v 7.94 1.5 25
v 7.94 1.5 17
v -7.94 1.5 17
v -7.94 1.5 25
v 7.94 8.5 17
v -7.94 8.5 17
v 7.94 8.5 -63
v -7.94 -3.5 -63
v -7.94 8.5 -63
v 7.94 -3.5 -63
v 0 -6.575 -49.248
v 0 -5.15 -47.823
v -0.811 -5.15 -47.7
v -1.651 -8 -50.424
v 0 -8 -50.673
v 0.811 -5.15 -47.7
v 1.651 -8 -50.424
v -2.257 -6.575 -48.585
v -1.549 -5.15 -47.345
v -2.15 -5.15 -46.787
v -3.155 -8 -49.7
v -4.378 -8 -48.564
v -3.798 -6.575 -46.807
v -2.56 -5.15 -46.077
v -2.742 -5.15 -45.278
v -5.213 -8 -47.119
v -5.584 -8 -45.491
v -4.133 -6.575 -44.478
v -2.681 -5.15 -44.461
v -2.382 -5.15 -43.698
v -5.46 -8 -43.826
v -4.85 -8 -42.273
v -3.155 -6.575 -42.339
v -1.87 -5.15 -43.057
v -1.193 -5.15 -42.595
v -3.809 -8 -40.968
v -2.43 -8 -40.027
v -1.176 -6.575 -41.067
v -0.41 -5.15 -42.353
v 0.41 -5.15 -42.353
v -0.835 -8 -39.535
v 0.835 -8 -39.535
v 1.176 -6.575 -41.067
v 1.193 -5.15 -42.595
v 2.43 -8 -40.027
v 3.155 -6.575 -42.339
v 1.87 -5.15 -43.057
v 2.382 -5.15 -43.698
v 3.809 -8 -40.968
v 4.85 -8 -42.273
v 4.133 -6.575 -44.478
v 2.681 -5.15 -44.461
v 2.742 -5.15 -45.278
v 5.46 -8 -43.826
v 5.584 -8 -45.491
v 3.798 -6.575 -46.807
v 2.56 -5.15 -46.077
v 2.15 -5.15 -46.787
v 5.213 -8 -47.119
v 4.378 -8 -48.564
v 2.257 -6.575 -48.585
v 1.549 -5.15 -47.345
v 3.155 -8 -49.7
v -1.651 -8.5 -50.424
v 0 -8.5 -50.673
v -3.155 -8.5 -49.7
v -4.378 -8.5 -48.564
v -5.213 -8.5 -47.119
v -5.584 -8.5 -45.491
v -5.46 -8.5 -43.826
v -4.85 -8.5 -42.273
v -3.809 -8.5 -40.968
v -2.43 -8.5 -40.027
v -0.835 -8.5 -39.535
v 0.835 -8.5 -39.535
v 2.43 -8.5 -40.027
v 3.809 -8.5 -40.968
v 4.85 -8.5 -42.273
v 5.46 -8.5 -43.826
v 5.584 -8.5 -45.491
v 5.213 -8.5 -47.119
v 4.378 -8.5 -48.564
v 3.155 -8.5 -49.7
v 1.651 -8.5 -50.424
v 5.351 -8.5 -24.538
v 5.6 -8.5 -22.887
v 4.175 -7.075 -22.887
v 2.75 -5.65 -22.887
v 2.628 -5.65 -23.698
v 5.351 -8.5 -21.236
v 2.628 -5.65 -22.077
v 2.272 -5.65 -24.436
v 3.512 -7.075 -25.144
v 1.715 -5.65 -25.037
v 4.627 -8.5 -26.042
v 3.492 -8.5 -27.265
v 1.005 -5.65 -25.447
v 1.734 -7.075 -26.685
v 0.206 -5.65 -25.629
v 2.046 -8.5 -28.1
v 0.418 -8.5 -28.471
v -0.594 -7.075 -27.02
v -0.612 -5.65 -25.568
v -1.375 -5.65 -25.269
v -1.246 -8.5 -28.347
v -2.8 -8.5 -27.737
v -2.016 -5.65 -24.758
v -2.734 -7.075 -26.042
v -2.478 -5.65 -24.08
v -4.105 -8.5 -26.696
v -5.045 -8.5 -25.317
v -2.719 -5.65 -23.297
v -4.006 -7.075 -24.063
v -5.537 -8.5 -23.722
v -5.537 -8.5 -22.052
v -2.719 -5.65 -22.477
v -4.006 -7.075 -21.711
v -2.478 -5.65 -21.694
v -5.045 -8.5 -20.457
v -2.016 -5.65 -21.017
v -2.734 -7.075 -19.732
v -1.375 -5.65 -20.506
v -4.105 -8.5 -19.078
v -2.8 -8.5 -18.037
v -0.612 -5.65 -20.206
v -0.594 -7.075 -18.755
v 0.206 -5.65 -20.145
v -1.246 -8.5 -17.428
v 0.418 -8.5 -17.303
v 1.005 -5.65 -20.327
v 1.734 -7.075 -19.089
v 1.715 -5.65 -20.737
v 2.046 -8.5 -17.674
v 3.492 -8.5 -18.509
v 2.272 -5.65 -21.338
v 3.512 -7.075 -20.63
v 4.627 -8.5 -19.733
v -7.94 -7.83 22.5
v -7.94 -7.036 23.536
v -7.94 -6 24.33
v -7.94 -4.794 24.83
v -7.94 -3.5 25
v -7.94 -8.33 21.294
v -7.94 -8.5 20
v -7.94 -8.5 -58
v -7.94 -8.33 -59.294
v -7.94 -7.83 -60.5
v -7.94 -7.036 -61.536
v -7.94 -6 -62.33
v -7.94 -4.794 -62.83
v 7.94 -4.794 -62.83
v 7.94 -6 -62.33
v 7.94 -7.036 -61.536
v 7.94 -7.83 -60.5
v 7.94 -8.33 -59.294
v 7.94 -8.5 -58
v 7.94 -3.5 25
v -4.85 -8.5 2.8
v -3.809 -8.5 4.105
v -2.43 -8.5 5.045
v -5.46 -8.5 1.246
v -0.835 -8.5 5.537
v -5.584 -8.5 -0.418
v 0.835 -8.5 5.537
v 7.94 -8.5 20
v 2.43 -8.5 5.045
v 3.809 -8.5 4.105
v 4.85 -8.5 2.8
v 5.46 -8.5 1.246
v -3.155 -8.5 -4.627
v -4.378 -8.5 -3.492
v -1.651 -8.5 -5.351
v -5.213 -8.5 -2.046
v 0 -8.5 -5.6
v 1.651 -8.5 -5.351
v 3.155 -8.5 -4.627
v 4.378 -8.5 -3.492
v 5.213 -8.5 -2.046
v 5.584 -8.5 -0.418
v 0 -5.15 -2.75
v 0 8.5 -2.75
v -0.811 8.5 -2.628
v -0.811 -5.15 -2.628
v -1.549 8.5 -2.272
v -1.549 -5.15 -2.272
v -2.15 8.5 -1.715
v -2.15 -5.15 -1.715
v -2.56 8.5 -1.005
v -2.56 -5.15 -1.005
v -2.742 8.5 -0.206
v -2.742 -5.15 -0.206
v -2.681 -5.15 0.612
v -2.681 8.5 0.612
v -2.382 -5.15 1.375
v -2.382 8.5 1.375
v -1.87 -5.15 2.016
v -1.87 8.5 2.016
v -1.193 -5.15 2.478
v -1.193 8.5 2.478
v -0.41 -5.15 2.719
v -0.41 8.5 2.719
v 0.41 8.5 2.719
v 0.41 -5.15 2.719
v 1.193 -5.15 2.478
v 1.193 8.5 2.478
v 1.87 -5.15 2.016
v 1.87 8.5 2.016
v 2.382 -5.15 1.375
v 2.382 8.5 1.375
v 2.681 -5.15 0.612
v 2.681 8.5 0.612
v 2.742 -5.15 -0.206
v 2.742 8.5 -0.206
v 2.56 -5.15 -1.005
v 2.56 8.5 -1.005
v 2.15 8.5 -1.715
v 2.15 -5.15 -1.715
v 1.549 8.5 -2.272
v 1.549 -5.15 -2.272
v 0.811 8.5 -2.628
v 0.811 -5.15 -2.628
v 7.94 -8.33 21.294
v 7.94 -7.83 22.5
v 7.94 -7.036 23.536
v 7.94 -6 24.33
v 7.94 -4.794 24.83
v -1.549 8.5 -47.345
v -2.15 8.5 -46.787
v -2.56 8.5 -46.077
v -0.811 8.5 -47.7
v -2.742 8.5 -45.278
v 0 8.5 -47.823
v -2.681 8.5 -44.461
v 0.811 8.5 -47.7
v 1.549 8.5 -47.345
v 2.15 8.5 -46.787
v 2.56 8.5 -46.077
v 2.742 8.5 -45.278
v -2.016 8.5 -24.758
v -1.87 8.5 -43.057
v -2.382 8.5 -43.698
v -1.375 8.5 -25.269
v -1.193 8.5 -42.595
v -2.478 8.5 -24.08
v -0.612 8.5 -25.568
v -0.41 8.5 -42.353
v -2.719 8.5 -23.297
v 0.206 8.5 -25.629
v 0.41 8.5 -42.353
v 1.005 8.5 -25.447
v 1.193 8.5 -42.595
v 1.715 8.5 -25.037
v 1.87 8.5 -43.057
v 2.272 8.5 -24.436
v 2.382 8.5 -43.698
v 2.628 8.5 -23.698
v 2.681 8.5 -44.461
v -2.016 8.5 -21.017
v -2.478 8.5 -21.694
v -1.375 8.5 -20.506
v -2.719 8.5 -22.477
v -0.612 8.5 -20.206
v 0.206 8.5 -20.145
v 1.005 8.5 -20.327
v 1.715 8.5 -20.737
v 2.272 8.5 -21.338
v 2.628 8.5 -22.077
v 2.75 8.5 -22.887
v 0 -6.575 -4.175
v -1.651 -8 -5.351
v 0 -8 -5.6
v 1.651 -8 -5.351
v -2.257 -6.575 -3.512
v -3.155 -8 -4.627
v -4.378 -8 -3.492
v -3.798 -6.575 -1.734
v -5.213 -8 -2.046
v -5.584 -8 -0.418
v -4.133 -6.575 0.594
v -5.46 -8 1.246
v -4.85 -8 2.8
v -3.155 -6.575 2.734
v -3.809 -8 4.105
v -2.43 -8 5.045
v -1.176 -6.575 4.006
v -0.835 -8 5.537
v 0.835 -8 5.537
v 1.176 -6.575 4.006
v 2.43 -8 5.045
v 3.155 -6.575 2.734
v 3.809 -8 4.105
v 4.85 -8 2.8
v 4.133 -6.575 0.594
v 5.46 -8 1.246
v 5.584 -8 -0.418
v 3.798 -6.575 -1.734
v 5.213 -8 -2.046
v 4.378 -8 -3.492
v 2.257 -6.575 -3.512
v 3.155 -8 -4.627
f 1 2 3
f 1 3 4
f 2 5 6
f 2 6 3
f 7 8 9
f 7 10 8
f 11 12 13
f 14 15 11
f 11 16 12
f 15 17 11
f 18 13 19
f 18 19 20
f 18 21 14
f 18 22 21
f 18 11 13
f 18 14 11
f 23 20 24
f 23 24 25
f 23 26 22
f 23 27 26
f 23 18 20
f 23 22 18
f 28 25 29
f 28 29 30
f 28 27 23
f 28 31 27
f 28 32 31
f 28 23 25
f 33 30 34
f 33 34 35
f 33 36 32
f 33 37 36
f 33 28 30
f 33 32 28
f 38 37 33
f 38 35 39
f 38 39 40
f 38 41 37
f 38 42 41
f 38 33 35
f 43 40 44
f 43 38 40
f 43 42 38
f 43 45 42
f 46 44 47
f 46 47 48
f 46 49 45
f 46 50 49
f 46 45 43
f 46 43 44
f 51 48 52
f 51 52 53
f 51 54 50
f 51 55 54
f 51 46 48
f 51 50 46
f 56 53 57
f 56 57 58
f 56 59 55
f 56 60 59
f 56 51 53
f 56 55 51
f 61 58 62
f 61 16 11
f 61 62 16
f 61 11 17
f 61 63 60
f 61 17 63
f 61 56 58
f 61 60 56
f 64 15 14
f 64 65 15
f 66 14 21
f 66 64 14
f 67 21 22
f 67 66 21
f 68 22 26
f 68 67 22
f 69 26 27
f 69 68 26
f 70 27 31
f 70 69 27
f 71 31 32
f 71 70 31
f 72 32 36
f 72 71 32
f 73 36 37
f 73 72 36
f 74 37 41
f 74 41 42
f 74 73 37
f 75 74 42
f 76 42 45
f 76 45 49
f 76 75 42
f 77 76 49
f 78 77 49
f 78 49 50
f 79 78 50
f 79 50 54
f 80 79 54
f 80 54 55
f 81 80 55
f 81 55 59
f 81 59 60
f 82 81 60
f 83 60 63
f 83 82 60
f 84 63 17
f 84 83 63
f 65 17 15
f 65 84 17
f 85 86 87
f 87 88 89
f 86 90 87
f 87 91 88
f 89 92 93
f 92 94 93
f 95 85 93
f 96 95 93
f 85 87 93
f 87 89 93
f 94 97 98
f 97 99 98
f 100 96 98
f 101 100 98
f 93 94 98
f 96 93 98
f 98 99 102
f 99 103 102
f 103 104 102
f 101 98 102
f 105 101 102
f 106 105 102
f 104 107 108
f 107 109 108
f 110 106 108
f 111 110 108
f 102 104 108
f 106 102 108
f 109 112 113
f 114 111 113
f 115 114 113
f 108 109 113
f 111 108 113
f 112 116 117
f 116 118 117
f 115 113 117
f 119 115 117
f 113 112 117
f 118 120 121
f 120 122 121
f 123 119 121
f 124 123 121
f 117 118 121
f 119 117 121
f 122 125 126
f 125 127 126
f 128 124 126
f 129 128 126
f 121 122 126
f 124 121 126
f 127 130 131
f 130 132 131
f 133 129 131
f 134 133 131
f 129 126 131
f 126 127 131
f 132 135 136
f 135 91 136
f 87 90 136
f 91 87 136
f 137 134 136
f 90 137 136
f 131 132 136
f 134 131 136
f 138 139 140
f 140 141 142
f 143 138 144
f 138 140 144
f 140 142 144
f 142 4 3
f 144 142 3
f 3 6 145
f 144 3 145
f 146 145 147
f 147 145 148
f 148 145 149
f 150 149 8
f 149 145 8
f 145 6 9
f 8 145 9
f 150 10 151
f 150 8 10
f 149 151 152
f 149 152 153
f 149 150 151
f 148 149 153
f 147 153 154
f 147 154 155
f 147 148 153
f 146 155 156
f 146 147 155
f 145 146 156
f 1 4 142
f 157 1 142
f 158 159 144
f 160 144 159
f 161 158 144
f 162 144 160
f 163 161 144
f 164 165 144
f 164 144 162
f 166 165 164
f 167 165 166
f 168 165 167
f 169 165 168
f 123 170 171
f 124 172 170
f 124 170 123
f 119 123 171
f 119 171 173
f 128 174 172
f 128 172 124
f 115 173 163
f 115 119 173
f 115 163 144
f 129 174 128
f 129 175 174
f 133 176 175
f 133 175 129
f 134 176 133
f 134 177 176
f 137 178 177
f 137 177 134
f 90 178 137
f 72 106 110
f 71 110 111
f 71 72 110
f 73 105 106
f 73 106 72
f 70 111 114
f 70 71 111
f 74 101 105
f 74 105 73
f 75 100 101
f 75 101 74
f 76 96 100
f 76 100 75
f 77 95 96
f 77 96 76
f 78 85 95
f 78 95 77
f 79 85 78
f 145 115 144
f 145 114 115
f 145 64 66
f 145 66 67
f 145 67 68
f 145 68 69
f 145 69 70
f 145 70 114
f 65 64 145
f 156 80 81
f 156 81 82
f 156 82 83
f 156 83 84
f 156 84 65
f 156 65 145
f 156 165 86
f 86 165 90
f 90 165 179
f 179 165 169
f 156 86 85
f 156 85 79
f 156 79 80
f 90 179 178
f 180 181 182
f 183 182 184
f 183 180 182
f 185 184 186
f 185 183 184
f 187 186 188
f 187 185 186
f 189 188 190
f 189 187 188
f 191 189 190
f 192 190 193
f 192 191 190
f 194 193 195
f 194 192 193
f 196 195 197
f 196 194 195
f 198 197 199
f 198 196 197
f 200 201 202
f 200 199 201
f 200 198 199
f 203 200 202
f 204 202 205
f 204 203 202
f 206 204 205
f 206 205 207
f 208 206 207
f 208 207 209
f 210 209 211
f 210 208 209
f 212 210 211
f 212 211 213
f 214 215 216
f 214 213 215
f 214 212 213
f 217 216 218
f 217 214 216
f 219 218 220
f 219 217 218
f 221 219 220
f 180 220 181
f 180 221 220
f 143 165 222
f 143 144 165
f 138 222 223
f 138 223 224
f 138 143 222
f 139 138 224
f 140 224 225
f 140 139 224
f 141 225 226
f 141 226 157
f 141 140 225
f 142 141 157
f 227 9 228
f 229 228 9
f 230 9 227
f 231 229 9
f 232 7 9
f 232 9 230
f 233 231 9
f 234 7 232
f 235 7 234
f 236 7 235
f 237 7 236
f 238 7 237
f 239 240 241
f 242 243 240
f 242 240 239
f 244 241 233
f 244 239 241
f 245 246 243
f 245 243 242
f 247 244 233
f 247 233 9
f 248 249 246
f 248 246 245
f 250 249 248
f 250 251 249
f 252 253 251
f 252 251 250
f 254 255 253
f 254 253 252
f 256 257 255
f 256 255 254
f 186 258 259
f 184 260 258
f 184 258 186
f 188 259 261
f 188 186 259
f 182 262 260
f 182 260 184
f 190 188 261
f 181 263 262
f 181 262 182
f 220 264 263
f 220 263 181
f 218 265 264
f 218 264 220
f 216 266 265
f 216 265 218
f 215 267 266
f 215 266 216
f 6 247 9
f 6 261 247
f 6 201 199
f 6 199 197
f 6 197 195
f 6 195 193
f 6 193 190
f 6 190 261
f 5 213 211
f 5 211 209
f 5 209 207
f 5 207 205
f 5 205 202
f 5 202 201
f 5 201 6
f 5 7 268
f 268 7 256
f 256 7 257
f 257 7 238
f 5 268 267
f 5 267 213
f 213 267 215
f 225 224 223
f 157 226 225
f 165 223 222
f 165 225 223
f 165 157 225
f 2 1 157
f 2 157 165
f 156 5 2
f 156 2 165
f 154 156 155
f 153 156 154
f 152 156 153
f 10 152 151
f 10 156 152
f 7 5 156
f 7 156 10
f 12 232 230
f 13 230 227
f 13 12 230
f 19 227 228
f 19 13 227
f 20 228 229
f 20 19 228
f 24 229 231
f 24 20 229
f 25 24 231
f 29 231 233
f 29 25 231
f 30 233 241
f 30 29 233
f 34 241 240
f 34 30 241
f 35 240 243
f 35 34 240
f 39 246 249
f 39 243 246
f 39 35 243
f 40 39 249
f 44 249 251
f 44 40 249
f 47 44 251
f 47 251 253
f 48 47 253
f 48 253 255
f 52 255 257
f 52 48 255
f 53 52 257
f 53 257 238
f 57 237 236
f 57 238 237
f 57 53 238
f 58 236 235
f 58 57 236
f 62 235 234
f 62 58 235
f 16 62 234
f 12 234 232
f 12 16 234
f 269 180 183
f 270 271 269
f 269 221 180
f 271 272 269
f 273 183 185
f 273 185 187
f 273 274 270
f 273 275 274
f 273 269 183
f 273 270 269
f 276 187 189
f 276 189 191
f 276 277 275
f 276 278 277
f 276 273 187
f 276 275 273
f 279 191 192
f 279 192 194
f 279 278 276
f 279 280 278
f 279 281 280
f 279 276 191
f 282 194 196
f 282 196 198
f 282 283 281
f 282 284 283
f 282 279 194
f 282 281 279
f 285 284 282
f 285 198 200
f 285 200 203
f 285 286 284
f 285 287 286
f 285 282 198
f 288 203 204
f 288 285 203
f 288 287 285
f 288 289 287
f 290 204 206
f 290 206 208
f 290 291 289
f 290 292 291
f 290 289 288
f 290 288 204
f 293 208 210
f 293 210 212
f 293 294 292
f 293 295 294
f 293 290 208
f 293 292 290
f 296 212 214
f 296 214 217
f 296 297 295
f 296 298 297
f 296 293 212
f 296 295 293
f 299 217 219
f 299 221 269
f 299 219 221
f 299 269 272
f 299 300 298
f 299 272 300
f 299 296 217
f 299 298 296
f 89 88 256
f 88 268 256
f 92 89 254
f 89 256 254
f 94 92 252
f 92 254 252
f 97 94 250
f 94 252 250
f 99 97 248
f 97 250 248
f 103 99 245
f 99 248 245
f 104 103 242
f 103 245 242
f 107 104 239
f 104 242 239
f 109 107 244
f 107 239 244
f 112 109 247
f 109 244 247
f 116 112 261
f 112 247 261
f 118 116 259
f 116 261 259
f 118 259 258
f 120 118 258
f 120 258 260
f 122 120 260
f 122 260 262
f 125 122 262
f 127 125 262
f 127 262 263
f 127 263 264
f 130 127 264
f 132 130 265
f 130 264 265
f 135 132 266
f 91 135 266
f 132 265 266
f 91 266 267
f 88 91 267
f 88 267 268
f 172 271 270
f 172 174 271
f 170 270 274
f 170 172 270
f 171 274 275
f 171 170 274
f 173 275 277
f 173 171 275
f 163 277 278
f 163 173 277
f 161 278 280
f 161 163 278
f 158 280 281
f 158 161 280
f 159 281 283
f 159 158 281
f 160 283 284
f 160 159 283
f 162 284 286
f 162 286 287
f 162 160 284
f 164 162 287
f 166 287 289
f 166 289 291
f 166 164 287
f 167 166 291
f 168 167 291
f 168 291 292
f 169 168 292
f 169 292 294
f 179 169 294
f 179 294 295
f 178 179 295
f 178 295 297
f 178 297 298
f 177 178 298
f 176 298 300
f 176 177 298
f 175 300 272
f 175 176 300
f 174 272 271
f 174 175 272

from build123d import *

# Parameters (mm, degrees)
RESSALTO_EXTRUS_O1_DEPTH             = 7.94
FILETE1_R                            = 5
ESCAREADO_PARA_SFHCS_M51_AT_2_COUNT  = 2
ESCAREADO_PARA_SFHCS_M51_AT_2_PITCH  = 45.072604626
ESCAREADO_PARA_SFHCS_M51_AT_3_COUNT  = 2
ESCAREADO_PARA_SFHCS_M51_AT_3_PITCH  = 80.029473244
ESCAREADO_PARA_SFHCS_M51_AT_4_COUNT  = 2
ESCAREADO_PARA_SFHCS_M51_AT_4_PITCH  = 73.938988881
ESCAREADO_PARA_SFHCS_M52_D           = 5.5
ESCAREADO_PARA_SFHCS_M52_CSINK_D     = 11.2
ESCAREADO_PARA_SFHCS_M52_CSINK_ANGLE = 90


with BuildPart() as part:
    # Esboço1 → Ressalto-extrusão1 (new, symmetric)
    with BuildSketch(Plane(origin=(0, 0, 0), x_dir=(0, 0, -1), z_dir=(1, 0, 0))):
        Polygon((-17, -8.5), (63, -8.5), (63, 8.5), (-17, 8.5), (-17, 1.5), (-25, 1.5), (-25, -8.5), align=None)
    extrude(amount=RESSALTO_EXTRUS_O1_DEPTH, both=True)

    # Filete1
    filete1_edges = [part.edges().sort_by_distance(p)[0] for p in [
        (0, -8.5, -63),
        (0, -8.5, 25),
    ]]
    fillet(filete1_edges, radius=FILETE1_R)

    # Esboço3 → Escareado para SFHCS M51 (revolve, cut)
    with BuildSketch(Plane(origin=(0, -8.5, -45.072604626), x_dir=(0, 0, -1), z_dir=(1, 0, 0))):
        Polygon((0, 0), (0, 31.652366702), (2.75, 30), (2.75, 3.35), (5.6, 0.5), (5.6, 0), align=None)
    escareado_para_sfhcs_m51 = revolve(axis=Axis((0, -14.85, -45.072604626), (0, 1, 0)), mode=Mode.SUBTRACT)

    # Escareado para SFHCS M51 at 2: Escareado para SFHCS M51 ×2
    with Locations(*[(0, 0, i * ESCAREADO_PARA_SFHCS_M51_AT_2_PITCH) for i in range(1, ESCAREADO_PARA_SFHCS_M51_AT_2_COUNT)]):
        add(escareado_para_sfhcs_m51, mode=Mode.SUBTRACT)

    # Escareado para SFHCS M51 at 3: Escareado para SFHCS M51 ×2
    with Locations(*[Vector(-0.8263205706487303, 0, 0.563200066160114) * (i * ESCAREADO_PARA_SFHCS_M51_AT_3_PITCH) for i in range(1, ESCAREADO_PARA_SFHCS_M51_AT_3_COUNT)]):
        add(escareado_para_sfhcs_m51, mode=Mode.SUBTRACT)

    # Escareado para SFHCS M51 at 4: Escareado para SFHCS M51 ×2
    with Locations(*[Vector(-0.894386047210078, 0, 0.44729587361827106) * (i * ESCAREADO_PARA_SFHCS_M51_AT_4_PITCH) for i in range(1, ESCAREADO_PARA_SFHCS_M51_AT_4_COUNT)]):
        add(escareado_para_sfhcs_m51, mode=Mode.SUBTRACT)

    # Escareado para SFHCS M52 (through all)
    with Locations(Plane(origin=(0, -8.5, 0), x_dir=(-1, 0, 0), z_dir=(0, -1, 0))):
        with Locations((0, 22.887127338)):
            CounterSinkHole(ESCAREADO_PARA_SFHCS_M52_D / 2, ESCAREADO_PARA_SFHCS_M52_CSINK_D / 2, counter_sink_angle=ESCAREADO_PARA_SFHCS_M52_CSINK_ANGLE)


solid = part.part
